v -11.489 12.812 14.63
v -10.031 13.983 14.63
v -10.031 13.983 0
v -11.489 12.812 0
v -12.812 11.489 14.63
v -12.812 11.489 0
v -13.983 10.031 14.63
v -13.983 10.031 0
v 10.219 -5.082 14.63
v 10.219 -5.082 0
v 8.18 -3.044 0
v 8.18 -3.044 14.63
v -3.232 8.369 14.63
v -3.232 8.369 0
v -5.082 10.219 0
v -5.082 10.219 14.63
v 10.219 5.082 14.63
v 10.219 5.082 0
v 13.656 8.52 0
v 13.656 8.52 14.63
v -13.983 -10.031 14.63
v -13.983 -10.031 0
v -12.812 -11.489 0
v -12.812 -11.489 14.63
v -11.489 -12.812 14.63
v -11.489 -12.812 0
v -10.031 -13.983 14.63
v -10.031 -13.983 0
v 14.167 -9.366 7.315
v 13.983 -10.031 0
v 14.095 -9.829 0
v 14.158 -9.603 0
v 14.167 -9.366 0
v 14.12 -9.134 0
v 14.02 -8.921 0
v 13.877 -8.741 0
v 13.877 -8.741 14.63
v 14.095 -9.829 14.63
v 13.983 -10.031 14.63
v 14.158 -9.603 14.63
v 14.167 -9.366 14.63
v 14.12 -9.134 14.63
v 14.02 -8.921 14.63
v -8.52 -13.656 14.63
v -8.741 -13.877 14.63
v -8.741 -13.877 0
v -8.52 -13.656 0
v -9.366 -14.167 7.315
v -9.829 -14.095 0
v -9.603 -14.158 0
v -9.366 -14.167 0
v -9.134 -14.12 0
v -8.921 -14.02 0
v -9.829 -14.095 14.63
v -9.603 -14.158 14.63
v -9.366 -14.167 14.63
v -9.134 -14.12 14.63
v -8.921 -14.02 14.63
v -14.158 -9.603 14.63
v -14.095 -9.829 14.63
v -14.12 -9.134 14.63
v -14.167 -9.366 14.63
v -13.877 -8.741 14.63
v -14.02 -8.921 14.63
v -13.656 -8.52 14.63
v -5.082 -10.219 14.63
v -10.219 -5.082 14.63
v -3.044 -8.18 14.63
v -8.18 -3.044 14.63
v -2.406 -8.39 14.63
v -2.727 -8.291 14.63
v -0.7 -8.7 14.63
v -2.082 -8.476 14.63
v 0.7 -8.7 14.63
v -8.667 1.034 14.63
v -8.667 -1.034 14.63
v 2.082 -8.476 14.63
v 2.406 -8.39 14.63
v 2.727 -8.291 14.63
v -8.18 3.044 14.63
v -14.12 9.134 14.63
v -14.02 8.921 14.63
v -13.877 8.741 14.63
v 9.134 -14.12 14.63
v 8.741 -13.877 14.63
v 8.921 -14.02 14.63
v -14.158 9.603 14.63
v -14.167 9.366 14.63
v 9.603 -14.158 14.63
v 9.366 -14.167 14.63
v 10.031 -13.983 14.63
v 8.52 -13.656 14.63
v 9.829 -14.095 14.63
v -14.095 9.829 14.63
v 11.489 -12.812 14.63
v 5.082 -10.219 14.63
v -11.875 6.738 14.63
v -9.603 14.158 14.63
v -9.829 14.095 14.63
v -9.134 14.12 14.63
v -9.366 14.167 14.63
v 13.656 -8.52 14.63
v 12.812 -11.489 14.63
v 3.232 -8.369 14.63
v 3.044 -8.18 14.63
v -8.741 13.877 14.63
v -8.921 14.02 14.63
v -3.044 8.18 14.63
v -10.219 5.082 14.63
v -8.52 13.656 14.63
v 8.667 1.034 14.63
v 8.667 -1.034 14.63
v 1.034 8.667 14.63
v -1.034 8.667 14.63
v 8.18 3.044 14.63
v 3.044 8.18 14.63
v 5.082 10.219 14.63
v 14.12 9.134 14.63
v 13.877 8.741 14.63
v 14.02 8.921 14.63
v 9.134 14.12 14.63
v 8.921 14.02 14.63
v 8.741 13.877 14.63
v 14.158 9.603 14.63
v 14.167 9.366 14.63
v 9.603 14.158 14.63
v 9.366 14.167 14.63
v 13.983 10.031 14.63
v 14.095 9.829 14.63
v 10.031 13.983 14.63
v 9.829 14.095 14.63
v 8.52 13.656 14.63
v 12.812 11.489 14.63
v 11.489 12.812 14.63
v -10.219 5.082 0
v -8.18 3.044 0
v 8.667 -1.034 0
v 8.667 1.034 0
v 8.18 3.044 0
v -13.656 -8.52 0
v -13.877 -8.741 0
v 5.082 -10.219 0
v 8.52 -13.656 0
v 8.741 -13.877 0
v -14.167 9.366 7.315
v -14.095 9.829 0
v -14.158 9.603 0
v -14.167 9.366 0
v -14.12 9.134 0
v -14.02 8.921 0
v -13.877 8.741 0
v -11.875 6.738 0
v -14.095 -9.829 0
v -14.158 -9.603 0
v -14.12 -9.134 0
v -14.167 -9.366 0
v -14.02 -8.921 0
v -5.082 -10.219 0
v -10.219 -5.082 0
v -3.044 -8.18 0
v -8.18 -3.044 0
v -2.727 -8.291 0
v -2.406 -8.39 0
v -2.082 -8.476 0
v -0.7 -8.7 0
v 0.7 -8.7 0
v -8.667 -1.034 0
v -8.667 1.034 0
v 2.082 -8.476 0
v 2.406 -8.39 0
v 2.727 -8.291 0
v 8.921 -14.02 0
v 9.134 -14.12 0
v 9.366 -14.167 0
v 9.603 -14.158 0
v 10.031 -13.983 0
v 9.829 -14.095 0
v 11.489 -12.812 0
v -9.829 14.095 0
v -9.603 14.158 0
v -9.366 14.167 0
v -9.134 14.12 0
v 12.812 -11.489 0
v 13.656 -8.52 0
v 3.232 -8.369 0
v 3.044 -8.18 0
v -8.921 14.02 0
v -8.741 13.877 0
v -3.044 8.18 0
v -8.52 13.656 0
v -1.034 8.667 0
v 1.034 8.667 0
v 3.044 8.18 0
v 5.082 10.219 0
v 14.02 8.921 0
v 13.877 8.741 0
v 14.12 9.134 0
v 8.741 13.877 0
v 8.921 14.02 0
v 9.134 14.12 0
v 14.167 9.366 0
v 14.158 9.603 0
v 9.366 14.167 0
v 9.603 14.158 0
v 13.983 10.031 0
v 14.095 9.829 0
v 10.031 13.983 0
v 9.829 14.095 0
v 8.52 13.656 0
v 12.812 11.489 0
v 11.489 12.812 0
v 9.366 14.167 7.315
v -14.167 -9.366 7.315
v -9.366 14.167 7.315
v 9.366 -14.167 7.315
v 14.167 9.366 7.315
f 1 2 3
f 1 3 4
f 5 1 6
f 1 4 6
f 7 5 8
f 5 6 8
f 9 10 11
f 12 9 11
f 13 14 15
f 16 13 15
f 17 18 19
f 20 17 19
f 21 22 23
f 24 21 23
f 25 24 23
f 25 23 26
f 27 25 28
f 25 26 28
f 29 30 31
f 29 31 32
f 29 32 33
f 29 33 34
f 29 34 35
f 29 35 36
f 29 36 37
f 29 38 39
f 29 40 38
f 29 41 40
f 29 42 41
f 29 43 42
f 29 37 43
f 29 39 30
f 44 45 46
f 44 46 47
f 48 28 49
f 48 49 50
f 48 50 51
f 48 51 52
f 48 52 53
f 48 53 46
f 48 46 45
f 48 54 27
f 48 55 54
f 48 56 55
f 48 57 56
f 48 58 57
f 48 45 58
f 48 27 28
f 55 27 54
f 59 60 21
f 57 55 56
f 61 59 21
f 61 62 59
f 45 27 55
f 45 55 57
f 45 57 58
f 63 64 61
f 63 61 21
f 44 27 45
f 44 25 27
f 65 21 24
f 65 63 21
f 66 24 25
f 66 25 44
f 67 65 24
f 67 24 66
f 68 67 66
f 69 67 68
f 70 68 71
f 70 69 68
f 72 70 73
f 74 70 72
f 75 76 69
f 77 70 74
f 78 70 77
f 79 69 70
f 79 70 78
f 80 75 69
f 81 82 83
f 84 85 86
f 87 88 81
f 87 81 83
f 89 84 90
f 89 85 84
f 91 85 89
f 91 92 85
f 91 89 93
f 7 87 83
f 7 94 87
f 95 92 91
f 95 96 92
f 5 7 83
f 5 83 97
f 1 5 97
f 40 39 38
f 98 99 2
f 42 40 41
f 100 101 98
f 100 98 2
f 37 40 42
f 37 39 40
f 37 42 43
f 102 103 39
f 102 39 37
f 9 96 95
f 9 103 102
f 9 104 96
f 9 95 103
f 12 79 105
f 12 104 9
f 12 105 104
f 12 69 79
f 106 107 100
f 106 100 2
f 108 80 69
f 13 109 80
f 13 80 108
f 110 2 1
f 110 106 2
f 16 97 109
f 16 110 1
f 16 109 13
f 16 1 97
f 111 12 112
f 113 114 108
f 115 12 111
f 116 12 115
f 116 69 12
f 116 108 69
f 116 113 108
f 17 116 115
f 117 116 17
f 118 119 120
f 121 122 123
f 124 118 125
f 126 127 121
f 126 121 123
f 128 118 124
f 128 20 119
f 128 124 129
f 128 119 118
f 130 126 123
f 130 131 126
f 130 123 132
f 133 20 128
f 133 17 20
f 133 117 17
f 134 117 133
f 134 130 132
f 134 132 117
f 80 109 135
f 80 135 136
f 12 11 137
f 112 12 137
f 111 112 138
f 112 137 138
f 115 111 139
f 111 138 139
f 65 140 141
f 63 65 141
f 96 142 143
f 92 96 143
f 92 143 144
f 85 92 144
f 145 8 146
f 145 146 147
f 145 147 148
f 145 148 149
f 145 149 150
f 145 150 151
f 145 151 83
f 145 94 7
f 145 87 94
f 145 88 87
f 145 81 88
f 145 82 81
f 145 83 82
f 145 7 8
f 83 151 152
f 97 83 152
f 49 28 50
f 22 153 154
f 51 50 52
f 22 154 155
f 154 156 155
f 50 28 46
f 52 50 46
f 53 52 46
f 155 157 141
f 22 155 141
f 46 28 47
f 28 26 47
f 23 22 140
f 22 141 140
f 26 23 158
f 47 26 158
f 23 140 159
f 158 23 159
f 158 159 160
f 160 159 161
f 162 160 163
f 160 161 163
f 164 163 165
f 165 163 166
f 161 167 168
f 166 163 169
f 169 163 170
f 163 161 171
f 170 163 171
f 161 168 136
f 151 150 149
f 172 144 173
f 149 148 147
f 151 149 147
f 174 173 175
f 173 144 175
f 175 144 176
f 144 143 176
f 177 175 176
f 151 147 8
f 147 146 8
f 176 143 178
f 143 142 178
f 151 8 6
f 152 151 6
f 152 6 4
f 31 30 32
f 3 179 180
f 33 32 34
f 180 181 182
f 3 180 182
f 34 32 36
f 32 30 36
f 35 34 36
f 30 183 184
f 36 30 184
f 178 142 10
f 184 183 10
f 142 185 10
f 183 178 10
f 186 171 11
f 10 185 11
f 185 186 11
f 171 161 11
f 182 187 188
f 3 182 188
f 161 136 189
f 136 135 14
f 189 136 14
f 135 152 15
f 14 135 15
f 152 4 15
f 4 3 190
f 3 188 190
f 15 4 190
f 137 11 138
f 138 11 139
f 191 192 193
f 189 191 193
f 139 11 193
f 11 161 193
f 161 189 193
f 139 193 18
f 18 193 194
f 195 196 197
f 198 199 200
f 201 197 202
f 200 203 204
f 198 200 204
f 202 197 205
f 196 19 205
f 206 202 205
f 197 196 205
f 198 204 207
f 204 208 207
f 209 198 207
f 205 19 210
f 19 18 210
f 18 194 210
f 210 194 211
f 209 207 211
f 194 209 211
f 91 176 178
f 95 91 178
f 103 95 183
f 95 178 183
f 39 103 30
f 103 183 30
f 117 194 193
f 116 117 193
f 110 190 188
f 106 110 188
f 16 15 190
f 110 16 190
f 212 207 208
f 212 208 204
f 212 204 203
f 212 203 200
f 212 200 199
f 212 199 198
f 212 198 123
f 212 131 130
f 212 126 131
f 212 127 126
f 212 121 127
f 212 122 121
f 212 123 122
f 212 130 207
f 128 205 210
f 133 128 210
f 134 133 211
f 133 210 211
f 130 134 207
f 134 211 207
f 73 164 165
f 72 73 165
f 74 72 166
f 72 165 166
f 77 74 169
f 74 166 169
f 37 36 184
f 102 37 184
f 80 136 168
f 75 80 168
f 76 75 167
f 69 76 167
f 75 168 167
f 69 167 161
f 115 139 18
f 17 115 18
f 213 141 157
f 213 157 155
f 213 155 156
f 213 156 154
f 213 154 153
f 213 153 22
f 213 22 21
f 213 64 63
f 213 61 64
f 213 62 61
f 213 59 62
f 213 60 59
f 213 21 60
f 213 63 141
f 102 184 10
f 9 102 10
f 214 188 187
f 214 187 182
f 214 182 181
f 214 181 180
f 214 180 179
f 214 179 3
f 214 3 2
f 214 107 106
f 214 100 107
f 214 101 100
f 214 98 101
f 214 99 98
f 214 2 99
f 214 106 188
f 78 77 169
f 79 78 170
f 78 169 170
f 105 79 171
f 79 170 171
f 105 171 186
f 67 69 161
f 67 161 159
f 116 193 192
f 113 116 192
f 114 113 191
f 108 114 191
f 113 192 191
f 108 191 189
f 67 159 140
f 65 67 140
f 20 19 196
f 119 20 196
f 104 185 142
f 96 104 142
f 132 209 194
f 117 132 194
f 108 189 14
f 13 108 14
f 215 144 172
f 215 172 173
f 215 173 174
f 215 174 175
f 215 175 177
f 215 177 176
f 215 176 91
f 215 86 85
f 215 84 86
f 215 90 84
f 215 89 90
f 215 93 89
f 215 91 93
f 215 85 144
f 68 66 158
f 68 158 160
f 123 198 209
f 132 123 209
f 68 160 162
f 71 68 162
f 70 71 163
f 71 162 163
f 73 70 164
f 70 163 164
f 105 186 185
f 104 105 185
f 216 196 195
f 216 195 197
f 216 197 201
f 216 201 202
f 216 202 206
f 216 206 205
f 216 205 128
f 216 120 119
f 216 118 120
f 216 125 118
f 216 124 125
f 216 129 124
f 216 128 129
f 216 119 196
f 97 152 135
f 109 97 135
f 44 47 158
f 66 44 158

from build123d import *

# Parameters (mm, degrees)
BOSS_EXTRUDE1_DEPTH = 14.63
FILLET1_R           = 1


with BuildPart() as part:
    # Sketch1 → Boss-Extrude1 (new body)
    with BuildSketch(Plane.XY):
        with BuildLine():
            Line((-8.519586833, 13.656293319), (-9.325754445, 14.46246093))
            ThreePointArc((-9.325754445, 14.46246093), (-12.168247041, 12.168247045), (-14.462460931, 9.325754452))
            Line((-14.462460931, 9.325754452), (-11.8745961, 6.737889618))
            Line((-11.874596103, 6.737889615), (-10.218772523, 5.082066036))
            Line((-10.218772523, 5.082066036), (-8.180331434, 3.043624946))
            ThreePointArc((-8.180331434, 3.043624946), (-8.7282, 0), (-8.18033144, -3.043624947))
            Line((-8.18033144, -3.043624947), (-10.218772531, -5.082066037))
            Line((-10.218772528, -5.082066035), (-13.656293332, -8.519586838))
            Line((-13.656293332, -8.519586838), (-14.462460943, -9.32575445))
            ThreePointArc((-14.462460943, -9.32575445), (-12.168247058, -12.168247046), (-9.325754465, -14.462460936))
            Line((-9.325754465, -14.462460936), (-8.519586857, -13.656293329))
            Line((-8.519586853, -13.656293332), (-5.082066058, -10.218772534))
            Line((-5.082066049, -10.218772528), (-3.043624959, -8.180331439))
            ThreePointArc((-3.043624959, -8.180331439), (-2.566843213, -8.342229394), (-2.081519018, -8.476364428))
            ThreePointArc((-2.081519021, -8.476364441), (-1e-08, -8.728200016), (2.081519001, -8.47636444))
            ThreePointArc((2.081518999, -8.476364431), (2.566843194, -8.342229397), (3.04362494, -8.180331443))
            Line((3.04362494, -8.180331443), (3.232471481, -8.369177985))
            Line((3.232471481, -8.369177985), (5.082066029, -10.218772535))
            Line((5.082066028, -10.21877254), (8.519586825, -13.656293337))
            Line((8.519586826, -13.656293336), (9.325754437, -14.462460949))
            ThreePointArc((9.325754437, -14.462460949), (12.168247033, -12.168247063), (14.462460923, -9.32575447))
            Line((14.462460923, -9.32575447), (13.656293316, -8.519586862))
            Line((13.656293316, -8.519586862), (10.218772514, -5.082066055))
            Line((10.218772514, -5.082066055), (8.180331425, -3.043624964))
            ThreePointArc((8.180331425, -3.043624964), (8.728199992, -1.8e-08), (8.180331432, 3.043624929))
            Line((8.180331432, 3.043624929), (10.218772523, 5.082066019))
            Line((10.218772523, 5.082066019), (13.656293323, 8.51958682))
            Line((13.656293323, 8.51958682), (14.462460935, 9.325754432))
            ThreePointArc((14.462460935, 9.325754432), (12.16824705, 12.168247028), (9.325754457, 14.462460918))
            Line((9.325754457, 14.462460918), (8.519586849, 13.65629331))
            Line((8.519586849, 13.65629331), (5.082066046, 10.218772512))
            Line((5.082066041, 10.21877251), (3.043624951, 8.18033142))
            ThreePointArc((3.043624951, 8.18033142), (5e-09, 8.728199987), (-3.043624942, 8.180331427))
            Line((-3.043624942, 8.180331427), (-3.232471485, 8.36917797))
            Line((-3.232471485, 8.36917797), (-5.082066032, 10.218772518))
            Line((-5.082066032, 10.218772518), (-8.519586833, 13.656293319))
        make_face()
    extrude(amount=BOSS_EXTRUDE1_DEPTH)

    # Fillet1
    fillet1_edges = [part.edges().sort_by_distance(p)[0] for p in [
        (14.462460923, -9.32575447, 7.315),
        (9.325754437, -14.462460949, 7.315),
        (-9.325754465, -14.462460936, 7.315),
        (-14.462460943, -9.32575445, 7.315),
        (-14.462460931, 9.325754452, 7.315),
        (-9.325754445, 14.46246093, 7.315),
        (9.325754457, 14.462460918, 7.315),
        (14.462460935, 9.325754432, 7.315),
    ]]
    fillet(fillet1_edges, radius=FILLET1_R)


solid = part.part
